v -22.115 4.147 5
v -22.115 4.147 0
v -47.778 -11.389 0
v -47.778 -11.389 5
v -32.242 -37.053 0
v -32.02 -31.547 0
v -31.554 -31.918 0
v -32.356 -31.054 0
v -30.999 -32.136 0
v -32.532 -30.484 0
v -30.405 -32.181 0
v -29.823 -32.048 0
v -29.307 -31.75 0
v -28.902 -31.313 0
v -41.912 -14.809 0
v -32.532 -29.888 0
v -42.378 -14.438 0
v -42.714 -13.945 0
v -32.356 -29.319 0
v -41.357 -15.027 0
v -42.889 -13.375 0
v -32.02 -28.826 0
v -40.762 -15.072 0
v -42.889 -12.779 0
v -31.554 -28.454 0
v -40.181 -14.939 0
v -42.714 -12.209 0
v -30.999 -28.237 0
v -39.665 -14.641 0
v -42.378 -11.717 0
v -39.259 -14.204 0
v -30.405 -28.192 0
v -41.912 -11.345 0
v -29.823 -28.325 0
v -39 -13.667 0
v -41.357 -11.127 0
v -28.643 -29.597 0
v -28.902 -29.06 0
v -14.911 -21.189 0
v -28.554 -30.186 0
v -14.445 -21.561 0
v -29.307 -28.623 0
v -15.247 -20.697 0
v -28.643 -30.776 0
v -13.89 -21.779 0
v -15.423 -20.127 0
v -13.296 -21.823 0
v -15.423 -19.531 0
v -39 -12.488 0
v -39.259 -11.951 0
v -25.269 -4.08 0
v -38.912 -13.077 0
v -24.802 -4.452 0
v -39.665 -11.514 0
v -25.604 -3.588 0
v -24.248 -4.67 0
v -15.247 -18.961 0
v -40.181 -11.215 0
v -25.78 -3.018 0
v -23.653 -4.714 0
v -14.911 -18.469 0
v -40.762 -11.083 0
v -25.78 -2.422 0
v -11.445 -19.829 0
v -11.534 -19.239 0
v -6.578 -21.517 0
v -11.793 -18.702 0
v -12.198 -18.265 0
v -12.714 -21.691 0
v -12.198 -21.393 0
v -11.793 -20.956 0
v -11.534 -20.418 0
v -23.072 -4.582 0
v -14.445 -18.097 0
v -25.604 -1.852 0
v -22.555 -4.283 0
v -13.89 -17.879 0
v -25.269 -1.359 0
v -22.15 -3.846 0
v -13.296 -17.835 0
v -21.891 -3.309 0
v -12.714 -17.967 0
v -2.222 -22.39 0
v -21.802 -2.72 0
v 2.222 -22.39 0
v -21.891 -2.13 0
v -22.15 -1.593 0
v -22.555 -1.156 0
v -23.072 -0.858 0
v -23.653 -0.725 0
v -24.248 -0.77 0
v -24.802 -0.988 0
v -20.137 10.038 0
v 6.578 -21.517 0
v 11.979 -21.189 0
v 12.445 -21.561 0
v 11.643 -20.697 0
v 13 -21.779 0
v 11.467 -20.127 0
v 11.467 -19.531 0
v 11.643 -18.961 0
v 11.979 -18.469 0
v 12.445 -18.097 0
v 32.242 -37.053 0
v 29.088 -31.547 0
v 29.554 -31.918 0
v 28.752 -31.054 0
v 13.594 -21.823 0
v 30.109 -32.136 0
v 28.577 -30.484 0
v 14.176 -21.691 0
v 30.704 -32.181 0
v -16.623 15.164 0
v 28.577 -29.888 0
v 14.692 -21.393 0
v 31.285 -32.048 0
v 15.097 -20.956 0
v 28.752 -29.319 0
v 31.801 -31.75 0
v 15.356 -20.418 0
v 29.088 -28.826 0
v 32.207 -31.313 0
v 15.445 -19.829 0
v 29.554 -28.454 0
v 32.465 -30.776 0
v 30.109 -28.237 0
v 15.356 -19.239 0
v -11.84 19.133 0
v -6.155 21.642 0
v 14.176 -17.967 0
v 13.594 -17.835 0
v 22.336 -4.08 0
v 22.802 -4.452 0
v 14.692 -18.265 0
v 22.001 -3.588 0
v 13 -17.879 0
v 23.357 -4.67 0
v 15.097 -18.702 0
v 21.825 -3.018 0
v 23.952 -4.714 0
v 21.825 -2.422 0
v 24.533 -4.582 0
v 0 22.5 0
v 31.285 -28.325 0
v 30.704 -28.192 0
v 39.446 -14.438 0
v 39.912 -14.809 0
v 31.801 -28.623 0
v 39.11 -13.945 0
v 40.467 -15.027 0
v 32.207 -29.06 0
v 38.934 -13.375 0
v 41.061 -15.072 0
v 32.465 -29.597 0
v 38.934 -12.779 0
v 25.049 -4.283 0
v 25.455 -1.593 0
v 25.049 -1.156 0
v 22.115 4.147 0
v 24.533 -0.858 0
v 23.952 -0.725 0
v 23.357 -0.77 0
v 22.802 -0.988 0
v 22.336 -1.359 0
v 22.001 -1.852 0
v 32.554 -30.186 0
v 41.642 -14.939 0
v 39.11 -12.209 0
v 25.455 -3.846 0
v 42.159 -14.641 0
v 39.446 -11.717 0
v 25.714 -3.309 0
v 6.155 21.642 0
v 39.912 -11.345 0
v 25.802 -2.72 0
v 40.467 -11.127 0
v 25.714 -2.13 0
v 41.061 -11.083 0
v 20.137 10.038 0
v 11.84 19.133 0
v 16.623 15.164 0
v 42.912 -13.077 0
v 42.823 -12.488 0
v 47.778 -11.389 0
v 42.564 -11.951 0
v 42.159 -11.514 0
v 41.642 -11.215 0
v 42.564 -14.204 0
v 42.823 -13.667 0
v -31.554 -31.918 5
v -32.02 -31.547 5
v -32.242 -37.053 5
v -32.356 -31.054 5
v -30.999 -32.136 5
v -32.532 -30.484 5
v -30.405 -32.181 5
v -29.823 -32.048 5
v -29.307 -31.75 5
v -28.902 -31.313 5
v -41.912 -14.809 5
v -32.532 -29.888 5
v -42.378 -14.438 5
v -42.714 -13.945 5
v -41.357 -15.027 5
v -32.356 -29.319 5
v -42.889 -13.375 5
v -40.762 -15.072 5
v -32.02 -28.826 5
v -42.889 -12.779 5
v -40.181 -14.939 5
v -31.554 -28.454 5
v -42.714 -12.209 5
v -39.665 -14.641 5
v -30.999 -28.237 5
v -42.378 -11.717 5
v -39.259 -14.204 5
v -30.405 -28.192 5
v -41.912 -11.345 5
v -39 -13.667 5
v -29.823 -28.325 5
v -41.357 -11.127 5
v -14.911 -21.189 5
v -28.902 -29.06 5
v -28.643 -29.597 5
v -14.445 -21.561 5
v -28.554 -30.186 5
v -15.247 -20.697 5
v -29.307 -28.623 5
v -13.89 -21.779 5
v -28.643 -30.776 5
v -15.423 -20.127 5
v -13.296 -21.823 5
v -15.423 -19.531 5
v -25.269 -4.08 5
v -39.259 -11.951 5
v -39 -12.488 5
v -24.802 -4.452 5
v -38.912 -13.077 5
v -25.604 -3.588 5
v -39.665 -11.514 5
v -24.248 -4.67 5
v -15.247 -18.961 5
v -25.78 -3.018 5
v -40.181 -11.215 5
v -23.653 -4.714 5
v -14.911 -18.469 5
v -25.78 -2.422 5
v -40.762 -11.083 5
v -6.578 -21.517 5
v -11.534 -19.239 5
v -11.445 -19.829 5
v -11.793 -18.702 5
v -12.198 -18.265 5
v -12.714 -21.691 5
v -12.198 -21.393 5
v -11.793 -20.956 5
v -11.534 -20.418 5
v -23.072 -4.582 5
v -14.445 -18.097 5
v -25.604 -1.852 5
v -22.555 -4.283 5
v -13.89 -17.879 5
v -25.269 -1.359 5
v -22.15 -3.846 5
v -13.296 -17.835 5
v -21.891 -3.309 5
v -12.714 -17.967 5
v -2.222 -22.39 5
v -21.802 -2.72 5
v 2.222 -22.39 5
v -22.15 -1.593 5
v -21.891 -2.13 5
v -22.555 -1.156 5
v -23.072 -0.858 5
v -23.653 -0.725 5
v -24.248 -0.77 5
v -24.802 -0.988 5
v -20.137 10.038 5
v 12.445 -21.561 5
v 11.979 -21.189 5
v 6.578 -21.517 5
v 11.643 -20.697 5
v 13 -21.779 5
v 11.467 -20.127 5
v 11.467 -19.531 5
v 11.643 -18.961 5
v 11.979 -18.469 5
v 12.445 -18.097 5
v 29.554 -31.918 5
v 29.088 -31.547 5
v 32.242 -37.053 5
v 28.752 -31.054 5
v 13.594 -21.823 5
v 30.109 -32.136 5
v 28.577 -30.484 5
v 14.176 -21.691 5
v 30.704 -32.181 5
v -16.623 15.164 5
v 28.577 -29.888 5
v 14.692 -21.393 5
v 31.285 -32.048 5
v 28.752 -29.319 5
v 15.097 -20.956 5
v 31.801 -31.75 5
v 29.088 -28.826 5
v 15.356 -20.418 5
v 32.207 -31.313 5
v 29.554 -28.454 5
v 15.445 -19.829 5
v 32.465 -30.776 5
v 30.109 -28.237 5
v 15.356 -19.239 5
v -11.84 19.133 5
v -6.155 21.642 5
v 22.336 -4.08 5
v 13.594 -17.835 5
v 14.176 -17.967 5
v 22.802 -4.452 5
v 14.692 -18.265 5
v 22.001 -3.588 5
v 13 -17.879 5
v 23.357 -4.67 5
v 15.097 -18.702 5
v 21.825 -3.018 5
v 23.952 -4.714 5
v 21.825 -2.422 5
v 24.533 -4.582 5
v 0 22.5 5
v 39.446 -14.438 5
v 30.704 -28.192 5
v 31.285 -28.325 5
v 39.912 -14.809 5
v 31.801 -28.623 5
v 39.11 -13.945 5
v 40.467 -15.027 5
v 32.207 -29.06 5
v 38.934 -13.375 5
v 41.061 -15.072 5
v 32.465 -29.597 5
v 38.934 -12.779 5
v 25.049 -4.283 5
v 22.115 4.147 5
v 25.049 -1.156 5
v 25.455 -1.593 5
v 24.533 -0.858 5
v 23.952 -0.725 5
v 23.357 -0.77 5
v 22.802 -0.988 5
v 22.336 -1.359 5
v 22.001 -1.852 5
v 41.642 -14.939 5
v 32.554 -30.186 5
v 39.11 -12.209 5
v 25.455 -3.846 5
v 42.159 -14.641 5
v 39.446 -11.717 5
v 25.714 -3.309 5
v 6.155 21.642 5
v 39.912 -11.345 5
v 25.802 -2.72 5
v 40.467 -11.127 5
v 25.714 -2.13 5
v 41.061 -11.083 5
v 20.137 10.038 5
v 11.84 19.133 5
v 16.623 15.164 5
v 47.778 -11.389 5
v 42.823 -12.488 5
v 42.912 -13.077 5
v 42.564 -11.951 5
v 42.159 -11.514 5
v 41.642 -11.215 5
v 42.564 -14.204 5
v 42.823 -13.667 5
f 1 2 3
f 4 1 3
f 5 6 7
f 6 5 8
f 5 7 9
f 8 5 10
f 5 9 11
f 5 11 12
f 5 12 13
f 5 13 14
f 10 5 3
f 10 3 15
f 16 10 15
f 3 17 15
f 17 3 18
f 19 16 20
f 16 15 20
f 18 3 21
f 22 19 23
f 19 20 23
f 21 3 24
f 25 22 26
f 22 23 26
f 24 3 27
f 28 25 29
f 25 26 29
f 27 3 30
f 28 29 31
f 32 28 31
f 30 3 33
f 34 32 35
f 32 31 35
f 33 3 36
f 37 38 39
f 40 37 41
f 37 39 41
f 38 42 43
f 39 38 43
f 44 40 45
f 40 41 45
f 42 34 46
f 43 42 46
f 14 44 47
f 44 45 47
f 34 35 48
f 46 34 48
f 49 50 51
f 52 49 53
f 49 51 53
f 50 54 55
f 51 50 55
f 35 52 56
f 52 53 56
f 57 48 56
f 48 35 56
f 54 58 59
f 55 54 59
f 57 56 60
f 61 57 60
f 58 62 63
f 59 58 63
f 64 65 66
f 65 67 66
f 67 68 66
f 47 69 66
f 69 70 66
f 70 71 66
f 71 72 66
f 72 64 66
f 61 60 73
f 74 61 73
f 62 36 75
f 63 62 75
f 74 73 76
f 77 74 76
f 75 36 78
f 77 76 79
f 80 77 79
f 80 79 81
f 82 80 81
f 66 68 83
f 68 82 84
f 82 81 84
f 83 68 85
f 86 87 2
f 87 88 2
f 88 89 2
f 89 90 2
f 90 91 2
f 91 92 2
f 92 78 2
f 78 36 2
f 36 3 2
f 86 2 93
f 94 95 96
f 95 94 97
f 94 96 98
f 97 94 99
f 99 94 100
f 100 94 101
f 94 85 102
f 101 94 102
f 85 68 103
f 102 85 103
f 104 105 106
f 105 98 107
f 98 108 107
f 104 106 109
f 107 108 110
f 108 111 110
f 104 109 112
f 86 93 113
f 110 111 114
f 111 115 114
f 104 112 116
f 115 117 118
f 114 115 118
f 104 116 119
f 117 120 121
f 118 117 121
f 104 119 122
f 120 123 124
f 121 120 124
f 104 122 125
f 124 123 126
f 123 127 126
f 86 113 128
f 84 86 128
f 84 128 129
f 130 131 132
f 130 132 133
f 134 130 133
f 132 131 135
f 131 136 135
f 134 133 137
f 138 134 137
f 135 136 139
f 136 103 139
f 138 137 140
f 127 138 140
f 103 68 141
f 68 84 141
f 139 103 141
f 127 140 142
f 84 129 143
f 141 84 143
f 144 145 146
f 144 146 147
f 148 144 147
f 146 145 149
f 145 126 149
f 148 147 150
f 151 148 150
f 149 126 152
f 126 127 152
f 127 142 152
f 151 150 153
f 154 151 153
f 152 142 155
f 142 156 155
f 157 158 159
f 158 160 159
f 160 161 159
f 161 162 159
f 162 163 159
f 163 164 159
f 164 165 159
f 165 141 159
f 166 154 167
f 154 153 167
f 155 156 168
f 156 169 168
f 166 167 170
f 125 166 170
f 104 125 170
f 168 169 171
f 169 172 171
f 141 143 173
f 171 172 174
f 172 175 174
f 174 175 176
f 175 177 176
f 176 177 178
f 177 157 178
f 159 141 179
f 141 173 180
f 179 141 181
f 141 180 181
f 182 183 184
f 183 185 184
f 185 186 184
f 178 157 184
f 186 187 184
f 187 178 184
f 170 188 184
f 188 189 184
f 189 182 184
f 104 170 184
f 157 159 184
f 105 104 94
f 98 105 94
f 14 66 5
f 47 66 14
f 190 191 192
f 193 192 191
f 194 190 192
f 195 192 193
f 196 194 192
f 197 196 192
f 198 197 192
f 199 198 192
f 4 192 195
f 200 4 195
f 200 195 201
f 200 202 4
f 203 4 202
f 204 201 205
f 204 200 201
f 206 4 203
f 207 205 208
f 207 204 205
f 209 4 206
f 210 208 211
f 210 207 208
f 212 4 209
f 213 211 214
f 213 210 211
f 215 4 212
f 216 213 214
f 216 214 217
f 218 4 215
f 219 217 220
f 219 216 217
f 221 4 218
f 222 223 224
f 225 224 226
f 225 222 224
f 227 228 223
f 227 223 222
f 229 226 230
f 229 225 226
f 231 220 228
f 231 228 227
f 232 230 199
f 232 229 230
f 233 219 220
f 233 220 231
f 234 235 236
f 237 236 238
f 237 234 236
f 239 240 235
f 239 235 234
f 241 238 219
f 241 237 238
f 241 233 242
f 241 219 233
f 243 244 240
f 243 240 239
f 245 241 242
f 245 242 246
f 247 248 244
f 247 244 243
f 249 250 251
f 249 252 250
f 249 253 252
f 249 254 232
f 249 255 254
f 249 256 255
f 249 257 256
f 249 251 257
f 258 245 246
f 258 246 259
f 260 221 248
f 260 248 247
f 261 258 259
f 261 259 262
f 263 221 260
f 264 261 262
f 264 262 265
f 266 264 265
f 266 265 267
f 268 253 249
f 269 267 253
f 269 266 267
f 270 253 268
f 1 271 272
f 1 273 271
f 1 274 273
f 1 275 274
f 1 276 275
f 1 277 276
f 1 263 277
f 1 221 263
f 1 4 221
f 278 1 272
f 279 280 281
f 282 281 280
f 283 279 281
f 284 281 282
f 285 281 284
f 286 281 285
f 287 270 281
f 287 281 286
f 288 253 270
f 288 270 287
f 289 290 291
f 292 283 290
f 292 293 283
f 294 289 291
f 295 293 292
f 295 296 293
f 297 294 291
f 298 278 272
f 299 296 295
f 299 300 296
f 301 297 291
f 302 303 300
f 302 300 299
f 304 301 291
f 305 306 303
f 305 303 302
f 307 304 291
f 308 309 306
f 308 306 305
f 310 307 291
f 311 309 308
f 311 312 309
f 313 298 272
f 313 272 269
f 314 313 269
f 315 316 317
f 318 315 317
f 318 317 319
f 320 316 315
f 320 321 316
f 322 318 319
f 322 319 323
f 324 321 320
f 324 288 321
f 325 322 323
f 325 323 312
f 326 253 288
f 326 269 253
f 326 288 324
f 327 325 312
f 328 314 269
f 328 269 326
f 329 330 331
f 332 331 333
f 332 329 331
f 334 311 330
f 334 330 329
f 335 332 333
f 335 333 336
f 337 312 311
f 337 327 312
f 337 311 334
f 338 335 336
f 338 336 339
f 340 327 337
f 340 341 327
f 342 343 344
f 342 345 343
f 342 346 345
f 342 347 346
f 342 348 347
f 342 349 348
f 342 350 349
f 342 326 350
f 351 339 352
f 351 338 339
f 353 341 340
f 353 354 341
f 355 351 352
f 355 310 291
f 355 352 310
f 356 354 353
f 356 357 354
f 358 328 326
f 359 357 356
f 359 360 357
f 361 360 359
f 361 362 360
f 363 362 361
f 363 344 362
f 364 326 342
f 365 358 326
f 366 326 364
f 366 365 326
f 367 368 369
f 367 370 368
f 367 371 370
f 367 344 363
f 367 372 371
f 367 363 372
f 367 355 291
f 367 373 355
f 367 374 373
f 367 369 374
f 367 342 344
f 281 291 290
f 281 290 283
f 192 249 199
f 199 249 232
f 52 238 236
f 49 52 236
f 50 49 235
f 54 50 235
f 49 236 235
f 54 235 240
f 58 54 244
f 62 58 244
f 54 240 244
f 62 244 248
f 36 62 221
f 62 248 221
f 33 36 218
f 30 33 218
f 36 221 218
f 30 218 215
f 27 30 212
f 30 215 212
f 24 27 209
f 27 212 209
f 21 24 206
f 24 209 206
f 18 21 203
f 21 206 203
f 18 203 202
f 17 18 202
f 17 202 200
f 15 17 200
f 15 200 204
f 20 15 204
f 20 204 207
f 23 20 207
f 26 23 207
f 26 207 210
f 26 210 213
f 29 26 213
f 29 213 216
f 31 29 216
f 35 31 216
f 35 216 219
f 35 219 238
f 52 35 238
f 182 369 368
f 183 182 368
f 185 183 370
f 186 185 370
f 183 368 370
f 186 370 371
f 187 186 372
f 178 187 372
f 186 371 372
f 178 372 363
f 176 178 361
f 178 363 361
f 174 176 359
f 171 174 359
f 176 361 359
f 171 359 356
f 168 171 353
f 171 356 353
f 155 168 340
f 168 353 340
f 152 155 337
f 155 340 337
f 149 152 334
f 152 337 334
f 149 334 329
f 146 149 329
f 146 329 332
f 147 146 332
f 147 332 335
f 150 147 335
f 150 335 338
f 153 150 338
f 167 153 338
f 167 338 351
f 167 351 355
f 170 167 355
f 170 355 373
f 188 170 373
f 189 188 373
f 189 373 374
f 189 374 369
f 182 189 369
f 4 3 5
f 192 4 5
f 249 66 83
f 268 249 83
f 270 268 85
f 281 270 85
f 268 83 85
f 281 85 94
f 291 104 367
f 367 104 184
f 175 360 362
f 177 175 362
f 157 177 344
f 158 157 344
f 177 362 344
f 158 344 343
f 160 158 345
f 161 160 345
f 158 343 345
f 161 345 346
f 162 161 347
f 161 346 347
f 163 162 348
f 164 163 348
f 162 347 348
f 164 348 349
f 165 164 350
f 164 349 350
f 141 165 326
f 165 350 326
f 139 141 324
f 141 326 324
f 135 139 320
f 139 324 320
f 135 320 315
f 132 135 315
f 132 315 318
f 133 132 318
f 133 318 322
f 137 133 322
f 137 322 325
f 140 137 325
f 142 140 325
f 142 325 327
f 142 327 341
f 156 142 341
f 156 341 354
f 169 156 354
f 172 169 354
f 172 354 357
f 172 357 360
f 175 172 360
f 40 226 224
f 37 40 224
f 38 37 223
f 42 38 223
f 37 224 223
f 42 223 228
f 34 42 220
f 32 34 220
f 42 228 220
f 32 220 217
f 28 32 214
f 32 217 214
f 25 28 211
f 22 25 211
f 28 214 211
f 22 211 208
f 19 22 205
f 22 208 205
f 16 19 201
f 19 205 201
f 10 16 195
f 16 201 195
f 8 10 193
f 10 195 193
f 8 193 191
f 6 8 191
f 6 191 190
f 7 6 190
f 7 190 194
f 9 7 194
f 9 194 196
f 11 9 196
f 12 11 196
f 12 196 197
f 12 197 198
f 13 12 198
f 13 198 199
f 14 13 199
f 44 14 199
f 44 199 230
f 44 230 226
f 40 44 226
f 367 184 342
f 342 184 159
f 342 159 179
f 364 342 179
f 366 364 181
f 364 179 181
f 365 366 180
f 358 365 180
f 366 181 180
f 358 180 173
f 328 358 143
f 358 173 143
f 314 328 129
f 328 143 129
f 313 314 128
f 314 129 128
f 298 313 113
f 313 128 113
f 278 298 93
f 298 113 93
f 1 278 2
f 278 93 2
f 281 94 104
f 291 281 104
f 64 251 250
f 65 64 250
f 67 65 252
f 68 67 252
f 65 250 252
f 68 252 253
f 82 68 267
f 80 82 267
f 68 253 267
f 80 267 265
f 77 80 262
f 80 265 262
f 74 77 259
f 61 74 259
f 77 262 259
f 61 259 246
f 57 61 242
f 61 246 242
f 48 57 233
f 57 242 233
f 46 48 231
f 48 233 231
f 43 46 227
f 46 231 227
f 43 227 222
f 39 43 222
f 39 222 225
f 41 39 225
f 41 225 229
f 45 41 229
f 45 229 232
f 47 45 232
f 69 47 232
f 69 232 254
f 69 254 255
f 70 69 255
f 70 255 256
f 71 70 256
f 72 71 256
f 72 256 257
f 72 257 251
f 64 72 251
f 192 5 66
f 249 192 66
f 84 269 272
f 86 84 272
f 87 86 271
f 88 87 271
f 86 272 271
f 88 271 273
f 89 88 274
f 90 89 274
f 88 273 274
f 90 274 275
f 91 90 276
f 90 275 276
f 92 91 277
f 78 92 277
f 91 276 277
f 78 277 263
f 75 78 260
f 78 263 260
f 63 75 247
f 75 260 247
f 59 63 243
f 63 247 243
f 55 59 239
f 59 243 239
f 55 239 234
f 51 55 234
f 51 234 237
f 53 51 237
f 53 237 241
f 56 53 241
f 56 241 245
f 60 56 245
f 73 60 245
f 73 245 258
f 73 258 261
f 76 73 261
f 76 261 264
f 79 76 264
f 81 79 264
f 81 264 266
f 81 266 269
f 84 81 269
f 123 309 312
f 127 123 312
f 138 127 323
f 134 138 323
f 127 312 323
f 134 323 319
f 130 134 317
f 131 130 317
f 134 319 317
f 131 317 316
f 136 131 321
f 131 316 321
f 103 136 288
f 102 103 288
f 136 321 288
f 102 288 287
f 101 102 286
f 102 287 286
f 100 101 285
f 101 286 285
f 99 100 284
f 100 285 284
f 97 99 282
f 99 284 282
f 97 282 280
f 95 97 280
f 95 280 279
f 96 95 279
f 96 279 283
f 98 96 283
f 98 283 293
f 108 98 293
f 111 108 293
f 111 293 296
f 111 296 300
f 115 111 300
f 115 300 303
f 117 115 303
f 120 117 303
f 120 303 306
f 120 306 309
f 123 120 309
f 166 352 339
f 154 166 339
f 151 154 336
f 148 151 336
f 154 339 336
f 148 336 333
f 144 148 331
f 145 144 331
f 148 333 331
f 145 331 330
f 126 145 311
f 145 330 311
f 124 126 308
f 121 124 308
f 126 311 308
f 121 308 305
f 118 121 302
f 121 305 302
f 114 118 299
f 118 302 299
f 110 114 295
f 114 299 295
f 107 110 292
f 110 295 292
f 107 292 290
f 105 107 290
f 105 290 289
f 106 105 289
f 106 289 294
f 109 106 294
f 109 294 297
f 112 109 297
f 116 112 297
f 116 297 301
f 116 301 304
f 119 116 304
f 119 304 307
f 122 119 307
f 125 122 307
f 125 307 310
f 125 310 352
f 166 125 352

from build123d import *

# Parameters (mm, degrees)
BOSS_EXTRUDE1_DEPTH = 5
SKETCH4_R           = 2
CUT_EXTRUDE1_DEPTH  = 10


with BuildPart() as part:
    # Sketch2 → Boss-Extrude1 (new body)
    with BuildSketch(Plane.XY):
        with BuildLine():
            Line((6.578363356, -21.516857009), (32.24208854, -37.05304733))
            Line((32.24208854, -37.05304733), (47.778278861, -11.389322146))
            Line((47.778278861, -11.389322146), (22.114553677, 4.146868175))
            ThreePointArc((22.114553677, 4.146868175), (0, 22.5), (-22.114553677, 4.146868175))
            Line((-22.114553677, 4.146868175), (-47.778278861, -11.389322146))
            Line((-47.778278861, -11.389322146), (-32.24208854, -37.05304733))
            Line((-32.24208854, -37.05304733), (-6.578363356, -21.516857009))
            ThreePointArc((-6.578363356, -21.516857009), (0, -22.5), (6.578363356, -21.516857009))
        make_face()
    extrude(amount=BOSS_EXTRUDE1_DEPTH)

    # Sketch4 → Cut-Extrude1 (cut)
    with BuildSketch(Plane.XY.offset(5)):
        with Locations((-40.911626277, -13.077244623)):
            Circle(SKETCH4_R)
        with Locations((-23.802476154, -2.719784409)):
            Circle(SKETCH4_R)
        with Locations((-13.44501594, -19.828934532)):
            Circle(SKETCH4_R)
        with Locations((-30.554166063, -30.186394746)):
            Circle(SKETCH4_R)
        with Locations((23.802476154, -2.719784409)):
            Circle(SKETCH4_R)
        with Locations((13.44501594, -19.828934532)):
            Circle(SKETCH4_R)
        with Locations((40.911626277, -13.077244623)):
            Circle(SKETCH4_R)
        with Locations((30.554166063, -30.186394746)):
            Circle(SKETCH4_R)
    extrude(amount=-CUT_EXTRUDE1_DEPTH, mode=Mode.SUBTRACT)


solid = part.part
